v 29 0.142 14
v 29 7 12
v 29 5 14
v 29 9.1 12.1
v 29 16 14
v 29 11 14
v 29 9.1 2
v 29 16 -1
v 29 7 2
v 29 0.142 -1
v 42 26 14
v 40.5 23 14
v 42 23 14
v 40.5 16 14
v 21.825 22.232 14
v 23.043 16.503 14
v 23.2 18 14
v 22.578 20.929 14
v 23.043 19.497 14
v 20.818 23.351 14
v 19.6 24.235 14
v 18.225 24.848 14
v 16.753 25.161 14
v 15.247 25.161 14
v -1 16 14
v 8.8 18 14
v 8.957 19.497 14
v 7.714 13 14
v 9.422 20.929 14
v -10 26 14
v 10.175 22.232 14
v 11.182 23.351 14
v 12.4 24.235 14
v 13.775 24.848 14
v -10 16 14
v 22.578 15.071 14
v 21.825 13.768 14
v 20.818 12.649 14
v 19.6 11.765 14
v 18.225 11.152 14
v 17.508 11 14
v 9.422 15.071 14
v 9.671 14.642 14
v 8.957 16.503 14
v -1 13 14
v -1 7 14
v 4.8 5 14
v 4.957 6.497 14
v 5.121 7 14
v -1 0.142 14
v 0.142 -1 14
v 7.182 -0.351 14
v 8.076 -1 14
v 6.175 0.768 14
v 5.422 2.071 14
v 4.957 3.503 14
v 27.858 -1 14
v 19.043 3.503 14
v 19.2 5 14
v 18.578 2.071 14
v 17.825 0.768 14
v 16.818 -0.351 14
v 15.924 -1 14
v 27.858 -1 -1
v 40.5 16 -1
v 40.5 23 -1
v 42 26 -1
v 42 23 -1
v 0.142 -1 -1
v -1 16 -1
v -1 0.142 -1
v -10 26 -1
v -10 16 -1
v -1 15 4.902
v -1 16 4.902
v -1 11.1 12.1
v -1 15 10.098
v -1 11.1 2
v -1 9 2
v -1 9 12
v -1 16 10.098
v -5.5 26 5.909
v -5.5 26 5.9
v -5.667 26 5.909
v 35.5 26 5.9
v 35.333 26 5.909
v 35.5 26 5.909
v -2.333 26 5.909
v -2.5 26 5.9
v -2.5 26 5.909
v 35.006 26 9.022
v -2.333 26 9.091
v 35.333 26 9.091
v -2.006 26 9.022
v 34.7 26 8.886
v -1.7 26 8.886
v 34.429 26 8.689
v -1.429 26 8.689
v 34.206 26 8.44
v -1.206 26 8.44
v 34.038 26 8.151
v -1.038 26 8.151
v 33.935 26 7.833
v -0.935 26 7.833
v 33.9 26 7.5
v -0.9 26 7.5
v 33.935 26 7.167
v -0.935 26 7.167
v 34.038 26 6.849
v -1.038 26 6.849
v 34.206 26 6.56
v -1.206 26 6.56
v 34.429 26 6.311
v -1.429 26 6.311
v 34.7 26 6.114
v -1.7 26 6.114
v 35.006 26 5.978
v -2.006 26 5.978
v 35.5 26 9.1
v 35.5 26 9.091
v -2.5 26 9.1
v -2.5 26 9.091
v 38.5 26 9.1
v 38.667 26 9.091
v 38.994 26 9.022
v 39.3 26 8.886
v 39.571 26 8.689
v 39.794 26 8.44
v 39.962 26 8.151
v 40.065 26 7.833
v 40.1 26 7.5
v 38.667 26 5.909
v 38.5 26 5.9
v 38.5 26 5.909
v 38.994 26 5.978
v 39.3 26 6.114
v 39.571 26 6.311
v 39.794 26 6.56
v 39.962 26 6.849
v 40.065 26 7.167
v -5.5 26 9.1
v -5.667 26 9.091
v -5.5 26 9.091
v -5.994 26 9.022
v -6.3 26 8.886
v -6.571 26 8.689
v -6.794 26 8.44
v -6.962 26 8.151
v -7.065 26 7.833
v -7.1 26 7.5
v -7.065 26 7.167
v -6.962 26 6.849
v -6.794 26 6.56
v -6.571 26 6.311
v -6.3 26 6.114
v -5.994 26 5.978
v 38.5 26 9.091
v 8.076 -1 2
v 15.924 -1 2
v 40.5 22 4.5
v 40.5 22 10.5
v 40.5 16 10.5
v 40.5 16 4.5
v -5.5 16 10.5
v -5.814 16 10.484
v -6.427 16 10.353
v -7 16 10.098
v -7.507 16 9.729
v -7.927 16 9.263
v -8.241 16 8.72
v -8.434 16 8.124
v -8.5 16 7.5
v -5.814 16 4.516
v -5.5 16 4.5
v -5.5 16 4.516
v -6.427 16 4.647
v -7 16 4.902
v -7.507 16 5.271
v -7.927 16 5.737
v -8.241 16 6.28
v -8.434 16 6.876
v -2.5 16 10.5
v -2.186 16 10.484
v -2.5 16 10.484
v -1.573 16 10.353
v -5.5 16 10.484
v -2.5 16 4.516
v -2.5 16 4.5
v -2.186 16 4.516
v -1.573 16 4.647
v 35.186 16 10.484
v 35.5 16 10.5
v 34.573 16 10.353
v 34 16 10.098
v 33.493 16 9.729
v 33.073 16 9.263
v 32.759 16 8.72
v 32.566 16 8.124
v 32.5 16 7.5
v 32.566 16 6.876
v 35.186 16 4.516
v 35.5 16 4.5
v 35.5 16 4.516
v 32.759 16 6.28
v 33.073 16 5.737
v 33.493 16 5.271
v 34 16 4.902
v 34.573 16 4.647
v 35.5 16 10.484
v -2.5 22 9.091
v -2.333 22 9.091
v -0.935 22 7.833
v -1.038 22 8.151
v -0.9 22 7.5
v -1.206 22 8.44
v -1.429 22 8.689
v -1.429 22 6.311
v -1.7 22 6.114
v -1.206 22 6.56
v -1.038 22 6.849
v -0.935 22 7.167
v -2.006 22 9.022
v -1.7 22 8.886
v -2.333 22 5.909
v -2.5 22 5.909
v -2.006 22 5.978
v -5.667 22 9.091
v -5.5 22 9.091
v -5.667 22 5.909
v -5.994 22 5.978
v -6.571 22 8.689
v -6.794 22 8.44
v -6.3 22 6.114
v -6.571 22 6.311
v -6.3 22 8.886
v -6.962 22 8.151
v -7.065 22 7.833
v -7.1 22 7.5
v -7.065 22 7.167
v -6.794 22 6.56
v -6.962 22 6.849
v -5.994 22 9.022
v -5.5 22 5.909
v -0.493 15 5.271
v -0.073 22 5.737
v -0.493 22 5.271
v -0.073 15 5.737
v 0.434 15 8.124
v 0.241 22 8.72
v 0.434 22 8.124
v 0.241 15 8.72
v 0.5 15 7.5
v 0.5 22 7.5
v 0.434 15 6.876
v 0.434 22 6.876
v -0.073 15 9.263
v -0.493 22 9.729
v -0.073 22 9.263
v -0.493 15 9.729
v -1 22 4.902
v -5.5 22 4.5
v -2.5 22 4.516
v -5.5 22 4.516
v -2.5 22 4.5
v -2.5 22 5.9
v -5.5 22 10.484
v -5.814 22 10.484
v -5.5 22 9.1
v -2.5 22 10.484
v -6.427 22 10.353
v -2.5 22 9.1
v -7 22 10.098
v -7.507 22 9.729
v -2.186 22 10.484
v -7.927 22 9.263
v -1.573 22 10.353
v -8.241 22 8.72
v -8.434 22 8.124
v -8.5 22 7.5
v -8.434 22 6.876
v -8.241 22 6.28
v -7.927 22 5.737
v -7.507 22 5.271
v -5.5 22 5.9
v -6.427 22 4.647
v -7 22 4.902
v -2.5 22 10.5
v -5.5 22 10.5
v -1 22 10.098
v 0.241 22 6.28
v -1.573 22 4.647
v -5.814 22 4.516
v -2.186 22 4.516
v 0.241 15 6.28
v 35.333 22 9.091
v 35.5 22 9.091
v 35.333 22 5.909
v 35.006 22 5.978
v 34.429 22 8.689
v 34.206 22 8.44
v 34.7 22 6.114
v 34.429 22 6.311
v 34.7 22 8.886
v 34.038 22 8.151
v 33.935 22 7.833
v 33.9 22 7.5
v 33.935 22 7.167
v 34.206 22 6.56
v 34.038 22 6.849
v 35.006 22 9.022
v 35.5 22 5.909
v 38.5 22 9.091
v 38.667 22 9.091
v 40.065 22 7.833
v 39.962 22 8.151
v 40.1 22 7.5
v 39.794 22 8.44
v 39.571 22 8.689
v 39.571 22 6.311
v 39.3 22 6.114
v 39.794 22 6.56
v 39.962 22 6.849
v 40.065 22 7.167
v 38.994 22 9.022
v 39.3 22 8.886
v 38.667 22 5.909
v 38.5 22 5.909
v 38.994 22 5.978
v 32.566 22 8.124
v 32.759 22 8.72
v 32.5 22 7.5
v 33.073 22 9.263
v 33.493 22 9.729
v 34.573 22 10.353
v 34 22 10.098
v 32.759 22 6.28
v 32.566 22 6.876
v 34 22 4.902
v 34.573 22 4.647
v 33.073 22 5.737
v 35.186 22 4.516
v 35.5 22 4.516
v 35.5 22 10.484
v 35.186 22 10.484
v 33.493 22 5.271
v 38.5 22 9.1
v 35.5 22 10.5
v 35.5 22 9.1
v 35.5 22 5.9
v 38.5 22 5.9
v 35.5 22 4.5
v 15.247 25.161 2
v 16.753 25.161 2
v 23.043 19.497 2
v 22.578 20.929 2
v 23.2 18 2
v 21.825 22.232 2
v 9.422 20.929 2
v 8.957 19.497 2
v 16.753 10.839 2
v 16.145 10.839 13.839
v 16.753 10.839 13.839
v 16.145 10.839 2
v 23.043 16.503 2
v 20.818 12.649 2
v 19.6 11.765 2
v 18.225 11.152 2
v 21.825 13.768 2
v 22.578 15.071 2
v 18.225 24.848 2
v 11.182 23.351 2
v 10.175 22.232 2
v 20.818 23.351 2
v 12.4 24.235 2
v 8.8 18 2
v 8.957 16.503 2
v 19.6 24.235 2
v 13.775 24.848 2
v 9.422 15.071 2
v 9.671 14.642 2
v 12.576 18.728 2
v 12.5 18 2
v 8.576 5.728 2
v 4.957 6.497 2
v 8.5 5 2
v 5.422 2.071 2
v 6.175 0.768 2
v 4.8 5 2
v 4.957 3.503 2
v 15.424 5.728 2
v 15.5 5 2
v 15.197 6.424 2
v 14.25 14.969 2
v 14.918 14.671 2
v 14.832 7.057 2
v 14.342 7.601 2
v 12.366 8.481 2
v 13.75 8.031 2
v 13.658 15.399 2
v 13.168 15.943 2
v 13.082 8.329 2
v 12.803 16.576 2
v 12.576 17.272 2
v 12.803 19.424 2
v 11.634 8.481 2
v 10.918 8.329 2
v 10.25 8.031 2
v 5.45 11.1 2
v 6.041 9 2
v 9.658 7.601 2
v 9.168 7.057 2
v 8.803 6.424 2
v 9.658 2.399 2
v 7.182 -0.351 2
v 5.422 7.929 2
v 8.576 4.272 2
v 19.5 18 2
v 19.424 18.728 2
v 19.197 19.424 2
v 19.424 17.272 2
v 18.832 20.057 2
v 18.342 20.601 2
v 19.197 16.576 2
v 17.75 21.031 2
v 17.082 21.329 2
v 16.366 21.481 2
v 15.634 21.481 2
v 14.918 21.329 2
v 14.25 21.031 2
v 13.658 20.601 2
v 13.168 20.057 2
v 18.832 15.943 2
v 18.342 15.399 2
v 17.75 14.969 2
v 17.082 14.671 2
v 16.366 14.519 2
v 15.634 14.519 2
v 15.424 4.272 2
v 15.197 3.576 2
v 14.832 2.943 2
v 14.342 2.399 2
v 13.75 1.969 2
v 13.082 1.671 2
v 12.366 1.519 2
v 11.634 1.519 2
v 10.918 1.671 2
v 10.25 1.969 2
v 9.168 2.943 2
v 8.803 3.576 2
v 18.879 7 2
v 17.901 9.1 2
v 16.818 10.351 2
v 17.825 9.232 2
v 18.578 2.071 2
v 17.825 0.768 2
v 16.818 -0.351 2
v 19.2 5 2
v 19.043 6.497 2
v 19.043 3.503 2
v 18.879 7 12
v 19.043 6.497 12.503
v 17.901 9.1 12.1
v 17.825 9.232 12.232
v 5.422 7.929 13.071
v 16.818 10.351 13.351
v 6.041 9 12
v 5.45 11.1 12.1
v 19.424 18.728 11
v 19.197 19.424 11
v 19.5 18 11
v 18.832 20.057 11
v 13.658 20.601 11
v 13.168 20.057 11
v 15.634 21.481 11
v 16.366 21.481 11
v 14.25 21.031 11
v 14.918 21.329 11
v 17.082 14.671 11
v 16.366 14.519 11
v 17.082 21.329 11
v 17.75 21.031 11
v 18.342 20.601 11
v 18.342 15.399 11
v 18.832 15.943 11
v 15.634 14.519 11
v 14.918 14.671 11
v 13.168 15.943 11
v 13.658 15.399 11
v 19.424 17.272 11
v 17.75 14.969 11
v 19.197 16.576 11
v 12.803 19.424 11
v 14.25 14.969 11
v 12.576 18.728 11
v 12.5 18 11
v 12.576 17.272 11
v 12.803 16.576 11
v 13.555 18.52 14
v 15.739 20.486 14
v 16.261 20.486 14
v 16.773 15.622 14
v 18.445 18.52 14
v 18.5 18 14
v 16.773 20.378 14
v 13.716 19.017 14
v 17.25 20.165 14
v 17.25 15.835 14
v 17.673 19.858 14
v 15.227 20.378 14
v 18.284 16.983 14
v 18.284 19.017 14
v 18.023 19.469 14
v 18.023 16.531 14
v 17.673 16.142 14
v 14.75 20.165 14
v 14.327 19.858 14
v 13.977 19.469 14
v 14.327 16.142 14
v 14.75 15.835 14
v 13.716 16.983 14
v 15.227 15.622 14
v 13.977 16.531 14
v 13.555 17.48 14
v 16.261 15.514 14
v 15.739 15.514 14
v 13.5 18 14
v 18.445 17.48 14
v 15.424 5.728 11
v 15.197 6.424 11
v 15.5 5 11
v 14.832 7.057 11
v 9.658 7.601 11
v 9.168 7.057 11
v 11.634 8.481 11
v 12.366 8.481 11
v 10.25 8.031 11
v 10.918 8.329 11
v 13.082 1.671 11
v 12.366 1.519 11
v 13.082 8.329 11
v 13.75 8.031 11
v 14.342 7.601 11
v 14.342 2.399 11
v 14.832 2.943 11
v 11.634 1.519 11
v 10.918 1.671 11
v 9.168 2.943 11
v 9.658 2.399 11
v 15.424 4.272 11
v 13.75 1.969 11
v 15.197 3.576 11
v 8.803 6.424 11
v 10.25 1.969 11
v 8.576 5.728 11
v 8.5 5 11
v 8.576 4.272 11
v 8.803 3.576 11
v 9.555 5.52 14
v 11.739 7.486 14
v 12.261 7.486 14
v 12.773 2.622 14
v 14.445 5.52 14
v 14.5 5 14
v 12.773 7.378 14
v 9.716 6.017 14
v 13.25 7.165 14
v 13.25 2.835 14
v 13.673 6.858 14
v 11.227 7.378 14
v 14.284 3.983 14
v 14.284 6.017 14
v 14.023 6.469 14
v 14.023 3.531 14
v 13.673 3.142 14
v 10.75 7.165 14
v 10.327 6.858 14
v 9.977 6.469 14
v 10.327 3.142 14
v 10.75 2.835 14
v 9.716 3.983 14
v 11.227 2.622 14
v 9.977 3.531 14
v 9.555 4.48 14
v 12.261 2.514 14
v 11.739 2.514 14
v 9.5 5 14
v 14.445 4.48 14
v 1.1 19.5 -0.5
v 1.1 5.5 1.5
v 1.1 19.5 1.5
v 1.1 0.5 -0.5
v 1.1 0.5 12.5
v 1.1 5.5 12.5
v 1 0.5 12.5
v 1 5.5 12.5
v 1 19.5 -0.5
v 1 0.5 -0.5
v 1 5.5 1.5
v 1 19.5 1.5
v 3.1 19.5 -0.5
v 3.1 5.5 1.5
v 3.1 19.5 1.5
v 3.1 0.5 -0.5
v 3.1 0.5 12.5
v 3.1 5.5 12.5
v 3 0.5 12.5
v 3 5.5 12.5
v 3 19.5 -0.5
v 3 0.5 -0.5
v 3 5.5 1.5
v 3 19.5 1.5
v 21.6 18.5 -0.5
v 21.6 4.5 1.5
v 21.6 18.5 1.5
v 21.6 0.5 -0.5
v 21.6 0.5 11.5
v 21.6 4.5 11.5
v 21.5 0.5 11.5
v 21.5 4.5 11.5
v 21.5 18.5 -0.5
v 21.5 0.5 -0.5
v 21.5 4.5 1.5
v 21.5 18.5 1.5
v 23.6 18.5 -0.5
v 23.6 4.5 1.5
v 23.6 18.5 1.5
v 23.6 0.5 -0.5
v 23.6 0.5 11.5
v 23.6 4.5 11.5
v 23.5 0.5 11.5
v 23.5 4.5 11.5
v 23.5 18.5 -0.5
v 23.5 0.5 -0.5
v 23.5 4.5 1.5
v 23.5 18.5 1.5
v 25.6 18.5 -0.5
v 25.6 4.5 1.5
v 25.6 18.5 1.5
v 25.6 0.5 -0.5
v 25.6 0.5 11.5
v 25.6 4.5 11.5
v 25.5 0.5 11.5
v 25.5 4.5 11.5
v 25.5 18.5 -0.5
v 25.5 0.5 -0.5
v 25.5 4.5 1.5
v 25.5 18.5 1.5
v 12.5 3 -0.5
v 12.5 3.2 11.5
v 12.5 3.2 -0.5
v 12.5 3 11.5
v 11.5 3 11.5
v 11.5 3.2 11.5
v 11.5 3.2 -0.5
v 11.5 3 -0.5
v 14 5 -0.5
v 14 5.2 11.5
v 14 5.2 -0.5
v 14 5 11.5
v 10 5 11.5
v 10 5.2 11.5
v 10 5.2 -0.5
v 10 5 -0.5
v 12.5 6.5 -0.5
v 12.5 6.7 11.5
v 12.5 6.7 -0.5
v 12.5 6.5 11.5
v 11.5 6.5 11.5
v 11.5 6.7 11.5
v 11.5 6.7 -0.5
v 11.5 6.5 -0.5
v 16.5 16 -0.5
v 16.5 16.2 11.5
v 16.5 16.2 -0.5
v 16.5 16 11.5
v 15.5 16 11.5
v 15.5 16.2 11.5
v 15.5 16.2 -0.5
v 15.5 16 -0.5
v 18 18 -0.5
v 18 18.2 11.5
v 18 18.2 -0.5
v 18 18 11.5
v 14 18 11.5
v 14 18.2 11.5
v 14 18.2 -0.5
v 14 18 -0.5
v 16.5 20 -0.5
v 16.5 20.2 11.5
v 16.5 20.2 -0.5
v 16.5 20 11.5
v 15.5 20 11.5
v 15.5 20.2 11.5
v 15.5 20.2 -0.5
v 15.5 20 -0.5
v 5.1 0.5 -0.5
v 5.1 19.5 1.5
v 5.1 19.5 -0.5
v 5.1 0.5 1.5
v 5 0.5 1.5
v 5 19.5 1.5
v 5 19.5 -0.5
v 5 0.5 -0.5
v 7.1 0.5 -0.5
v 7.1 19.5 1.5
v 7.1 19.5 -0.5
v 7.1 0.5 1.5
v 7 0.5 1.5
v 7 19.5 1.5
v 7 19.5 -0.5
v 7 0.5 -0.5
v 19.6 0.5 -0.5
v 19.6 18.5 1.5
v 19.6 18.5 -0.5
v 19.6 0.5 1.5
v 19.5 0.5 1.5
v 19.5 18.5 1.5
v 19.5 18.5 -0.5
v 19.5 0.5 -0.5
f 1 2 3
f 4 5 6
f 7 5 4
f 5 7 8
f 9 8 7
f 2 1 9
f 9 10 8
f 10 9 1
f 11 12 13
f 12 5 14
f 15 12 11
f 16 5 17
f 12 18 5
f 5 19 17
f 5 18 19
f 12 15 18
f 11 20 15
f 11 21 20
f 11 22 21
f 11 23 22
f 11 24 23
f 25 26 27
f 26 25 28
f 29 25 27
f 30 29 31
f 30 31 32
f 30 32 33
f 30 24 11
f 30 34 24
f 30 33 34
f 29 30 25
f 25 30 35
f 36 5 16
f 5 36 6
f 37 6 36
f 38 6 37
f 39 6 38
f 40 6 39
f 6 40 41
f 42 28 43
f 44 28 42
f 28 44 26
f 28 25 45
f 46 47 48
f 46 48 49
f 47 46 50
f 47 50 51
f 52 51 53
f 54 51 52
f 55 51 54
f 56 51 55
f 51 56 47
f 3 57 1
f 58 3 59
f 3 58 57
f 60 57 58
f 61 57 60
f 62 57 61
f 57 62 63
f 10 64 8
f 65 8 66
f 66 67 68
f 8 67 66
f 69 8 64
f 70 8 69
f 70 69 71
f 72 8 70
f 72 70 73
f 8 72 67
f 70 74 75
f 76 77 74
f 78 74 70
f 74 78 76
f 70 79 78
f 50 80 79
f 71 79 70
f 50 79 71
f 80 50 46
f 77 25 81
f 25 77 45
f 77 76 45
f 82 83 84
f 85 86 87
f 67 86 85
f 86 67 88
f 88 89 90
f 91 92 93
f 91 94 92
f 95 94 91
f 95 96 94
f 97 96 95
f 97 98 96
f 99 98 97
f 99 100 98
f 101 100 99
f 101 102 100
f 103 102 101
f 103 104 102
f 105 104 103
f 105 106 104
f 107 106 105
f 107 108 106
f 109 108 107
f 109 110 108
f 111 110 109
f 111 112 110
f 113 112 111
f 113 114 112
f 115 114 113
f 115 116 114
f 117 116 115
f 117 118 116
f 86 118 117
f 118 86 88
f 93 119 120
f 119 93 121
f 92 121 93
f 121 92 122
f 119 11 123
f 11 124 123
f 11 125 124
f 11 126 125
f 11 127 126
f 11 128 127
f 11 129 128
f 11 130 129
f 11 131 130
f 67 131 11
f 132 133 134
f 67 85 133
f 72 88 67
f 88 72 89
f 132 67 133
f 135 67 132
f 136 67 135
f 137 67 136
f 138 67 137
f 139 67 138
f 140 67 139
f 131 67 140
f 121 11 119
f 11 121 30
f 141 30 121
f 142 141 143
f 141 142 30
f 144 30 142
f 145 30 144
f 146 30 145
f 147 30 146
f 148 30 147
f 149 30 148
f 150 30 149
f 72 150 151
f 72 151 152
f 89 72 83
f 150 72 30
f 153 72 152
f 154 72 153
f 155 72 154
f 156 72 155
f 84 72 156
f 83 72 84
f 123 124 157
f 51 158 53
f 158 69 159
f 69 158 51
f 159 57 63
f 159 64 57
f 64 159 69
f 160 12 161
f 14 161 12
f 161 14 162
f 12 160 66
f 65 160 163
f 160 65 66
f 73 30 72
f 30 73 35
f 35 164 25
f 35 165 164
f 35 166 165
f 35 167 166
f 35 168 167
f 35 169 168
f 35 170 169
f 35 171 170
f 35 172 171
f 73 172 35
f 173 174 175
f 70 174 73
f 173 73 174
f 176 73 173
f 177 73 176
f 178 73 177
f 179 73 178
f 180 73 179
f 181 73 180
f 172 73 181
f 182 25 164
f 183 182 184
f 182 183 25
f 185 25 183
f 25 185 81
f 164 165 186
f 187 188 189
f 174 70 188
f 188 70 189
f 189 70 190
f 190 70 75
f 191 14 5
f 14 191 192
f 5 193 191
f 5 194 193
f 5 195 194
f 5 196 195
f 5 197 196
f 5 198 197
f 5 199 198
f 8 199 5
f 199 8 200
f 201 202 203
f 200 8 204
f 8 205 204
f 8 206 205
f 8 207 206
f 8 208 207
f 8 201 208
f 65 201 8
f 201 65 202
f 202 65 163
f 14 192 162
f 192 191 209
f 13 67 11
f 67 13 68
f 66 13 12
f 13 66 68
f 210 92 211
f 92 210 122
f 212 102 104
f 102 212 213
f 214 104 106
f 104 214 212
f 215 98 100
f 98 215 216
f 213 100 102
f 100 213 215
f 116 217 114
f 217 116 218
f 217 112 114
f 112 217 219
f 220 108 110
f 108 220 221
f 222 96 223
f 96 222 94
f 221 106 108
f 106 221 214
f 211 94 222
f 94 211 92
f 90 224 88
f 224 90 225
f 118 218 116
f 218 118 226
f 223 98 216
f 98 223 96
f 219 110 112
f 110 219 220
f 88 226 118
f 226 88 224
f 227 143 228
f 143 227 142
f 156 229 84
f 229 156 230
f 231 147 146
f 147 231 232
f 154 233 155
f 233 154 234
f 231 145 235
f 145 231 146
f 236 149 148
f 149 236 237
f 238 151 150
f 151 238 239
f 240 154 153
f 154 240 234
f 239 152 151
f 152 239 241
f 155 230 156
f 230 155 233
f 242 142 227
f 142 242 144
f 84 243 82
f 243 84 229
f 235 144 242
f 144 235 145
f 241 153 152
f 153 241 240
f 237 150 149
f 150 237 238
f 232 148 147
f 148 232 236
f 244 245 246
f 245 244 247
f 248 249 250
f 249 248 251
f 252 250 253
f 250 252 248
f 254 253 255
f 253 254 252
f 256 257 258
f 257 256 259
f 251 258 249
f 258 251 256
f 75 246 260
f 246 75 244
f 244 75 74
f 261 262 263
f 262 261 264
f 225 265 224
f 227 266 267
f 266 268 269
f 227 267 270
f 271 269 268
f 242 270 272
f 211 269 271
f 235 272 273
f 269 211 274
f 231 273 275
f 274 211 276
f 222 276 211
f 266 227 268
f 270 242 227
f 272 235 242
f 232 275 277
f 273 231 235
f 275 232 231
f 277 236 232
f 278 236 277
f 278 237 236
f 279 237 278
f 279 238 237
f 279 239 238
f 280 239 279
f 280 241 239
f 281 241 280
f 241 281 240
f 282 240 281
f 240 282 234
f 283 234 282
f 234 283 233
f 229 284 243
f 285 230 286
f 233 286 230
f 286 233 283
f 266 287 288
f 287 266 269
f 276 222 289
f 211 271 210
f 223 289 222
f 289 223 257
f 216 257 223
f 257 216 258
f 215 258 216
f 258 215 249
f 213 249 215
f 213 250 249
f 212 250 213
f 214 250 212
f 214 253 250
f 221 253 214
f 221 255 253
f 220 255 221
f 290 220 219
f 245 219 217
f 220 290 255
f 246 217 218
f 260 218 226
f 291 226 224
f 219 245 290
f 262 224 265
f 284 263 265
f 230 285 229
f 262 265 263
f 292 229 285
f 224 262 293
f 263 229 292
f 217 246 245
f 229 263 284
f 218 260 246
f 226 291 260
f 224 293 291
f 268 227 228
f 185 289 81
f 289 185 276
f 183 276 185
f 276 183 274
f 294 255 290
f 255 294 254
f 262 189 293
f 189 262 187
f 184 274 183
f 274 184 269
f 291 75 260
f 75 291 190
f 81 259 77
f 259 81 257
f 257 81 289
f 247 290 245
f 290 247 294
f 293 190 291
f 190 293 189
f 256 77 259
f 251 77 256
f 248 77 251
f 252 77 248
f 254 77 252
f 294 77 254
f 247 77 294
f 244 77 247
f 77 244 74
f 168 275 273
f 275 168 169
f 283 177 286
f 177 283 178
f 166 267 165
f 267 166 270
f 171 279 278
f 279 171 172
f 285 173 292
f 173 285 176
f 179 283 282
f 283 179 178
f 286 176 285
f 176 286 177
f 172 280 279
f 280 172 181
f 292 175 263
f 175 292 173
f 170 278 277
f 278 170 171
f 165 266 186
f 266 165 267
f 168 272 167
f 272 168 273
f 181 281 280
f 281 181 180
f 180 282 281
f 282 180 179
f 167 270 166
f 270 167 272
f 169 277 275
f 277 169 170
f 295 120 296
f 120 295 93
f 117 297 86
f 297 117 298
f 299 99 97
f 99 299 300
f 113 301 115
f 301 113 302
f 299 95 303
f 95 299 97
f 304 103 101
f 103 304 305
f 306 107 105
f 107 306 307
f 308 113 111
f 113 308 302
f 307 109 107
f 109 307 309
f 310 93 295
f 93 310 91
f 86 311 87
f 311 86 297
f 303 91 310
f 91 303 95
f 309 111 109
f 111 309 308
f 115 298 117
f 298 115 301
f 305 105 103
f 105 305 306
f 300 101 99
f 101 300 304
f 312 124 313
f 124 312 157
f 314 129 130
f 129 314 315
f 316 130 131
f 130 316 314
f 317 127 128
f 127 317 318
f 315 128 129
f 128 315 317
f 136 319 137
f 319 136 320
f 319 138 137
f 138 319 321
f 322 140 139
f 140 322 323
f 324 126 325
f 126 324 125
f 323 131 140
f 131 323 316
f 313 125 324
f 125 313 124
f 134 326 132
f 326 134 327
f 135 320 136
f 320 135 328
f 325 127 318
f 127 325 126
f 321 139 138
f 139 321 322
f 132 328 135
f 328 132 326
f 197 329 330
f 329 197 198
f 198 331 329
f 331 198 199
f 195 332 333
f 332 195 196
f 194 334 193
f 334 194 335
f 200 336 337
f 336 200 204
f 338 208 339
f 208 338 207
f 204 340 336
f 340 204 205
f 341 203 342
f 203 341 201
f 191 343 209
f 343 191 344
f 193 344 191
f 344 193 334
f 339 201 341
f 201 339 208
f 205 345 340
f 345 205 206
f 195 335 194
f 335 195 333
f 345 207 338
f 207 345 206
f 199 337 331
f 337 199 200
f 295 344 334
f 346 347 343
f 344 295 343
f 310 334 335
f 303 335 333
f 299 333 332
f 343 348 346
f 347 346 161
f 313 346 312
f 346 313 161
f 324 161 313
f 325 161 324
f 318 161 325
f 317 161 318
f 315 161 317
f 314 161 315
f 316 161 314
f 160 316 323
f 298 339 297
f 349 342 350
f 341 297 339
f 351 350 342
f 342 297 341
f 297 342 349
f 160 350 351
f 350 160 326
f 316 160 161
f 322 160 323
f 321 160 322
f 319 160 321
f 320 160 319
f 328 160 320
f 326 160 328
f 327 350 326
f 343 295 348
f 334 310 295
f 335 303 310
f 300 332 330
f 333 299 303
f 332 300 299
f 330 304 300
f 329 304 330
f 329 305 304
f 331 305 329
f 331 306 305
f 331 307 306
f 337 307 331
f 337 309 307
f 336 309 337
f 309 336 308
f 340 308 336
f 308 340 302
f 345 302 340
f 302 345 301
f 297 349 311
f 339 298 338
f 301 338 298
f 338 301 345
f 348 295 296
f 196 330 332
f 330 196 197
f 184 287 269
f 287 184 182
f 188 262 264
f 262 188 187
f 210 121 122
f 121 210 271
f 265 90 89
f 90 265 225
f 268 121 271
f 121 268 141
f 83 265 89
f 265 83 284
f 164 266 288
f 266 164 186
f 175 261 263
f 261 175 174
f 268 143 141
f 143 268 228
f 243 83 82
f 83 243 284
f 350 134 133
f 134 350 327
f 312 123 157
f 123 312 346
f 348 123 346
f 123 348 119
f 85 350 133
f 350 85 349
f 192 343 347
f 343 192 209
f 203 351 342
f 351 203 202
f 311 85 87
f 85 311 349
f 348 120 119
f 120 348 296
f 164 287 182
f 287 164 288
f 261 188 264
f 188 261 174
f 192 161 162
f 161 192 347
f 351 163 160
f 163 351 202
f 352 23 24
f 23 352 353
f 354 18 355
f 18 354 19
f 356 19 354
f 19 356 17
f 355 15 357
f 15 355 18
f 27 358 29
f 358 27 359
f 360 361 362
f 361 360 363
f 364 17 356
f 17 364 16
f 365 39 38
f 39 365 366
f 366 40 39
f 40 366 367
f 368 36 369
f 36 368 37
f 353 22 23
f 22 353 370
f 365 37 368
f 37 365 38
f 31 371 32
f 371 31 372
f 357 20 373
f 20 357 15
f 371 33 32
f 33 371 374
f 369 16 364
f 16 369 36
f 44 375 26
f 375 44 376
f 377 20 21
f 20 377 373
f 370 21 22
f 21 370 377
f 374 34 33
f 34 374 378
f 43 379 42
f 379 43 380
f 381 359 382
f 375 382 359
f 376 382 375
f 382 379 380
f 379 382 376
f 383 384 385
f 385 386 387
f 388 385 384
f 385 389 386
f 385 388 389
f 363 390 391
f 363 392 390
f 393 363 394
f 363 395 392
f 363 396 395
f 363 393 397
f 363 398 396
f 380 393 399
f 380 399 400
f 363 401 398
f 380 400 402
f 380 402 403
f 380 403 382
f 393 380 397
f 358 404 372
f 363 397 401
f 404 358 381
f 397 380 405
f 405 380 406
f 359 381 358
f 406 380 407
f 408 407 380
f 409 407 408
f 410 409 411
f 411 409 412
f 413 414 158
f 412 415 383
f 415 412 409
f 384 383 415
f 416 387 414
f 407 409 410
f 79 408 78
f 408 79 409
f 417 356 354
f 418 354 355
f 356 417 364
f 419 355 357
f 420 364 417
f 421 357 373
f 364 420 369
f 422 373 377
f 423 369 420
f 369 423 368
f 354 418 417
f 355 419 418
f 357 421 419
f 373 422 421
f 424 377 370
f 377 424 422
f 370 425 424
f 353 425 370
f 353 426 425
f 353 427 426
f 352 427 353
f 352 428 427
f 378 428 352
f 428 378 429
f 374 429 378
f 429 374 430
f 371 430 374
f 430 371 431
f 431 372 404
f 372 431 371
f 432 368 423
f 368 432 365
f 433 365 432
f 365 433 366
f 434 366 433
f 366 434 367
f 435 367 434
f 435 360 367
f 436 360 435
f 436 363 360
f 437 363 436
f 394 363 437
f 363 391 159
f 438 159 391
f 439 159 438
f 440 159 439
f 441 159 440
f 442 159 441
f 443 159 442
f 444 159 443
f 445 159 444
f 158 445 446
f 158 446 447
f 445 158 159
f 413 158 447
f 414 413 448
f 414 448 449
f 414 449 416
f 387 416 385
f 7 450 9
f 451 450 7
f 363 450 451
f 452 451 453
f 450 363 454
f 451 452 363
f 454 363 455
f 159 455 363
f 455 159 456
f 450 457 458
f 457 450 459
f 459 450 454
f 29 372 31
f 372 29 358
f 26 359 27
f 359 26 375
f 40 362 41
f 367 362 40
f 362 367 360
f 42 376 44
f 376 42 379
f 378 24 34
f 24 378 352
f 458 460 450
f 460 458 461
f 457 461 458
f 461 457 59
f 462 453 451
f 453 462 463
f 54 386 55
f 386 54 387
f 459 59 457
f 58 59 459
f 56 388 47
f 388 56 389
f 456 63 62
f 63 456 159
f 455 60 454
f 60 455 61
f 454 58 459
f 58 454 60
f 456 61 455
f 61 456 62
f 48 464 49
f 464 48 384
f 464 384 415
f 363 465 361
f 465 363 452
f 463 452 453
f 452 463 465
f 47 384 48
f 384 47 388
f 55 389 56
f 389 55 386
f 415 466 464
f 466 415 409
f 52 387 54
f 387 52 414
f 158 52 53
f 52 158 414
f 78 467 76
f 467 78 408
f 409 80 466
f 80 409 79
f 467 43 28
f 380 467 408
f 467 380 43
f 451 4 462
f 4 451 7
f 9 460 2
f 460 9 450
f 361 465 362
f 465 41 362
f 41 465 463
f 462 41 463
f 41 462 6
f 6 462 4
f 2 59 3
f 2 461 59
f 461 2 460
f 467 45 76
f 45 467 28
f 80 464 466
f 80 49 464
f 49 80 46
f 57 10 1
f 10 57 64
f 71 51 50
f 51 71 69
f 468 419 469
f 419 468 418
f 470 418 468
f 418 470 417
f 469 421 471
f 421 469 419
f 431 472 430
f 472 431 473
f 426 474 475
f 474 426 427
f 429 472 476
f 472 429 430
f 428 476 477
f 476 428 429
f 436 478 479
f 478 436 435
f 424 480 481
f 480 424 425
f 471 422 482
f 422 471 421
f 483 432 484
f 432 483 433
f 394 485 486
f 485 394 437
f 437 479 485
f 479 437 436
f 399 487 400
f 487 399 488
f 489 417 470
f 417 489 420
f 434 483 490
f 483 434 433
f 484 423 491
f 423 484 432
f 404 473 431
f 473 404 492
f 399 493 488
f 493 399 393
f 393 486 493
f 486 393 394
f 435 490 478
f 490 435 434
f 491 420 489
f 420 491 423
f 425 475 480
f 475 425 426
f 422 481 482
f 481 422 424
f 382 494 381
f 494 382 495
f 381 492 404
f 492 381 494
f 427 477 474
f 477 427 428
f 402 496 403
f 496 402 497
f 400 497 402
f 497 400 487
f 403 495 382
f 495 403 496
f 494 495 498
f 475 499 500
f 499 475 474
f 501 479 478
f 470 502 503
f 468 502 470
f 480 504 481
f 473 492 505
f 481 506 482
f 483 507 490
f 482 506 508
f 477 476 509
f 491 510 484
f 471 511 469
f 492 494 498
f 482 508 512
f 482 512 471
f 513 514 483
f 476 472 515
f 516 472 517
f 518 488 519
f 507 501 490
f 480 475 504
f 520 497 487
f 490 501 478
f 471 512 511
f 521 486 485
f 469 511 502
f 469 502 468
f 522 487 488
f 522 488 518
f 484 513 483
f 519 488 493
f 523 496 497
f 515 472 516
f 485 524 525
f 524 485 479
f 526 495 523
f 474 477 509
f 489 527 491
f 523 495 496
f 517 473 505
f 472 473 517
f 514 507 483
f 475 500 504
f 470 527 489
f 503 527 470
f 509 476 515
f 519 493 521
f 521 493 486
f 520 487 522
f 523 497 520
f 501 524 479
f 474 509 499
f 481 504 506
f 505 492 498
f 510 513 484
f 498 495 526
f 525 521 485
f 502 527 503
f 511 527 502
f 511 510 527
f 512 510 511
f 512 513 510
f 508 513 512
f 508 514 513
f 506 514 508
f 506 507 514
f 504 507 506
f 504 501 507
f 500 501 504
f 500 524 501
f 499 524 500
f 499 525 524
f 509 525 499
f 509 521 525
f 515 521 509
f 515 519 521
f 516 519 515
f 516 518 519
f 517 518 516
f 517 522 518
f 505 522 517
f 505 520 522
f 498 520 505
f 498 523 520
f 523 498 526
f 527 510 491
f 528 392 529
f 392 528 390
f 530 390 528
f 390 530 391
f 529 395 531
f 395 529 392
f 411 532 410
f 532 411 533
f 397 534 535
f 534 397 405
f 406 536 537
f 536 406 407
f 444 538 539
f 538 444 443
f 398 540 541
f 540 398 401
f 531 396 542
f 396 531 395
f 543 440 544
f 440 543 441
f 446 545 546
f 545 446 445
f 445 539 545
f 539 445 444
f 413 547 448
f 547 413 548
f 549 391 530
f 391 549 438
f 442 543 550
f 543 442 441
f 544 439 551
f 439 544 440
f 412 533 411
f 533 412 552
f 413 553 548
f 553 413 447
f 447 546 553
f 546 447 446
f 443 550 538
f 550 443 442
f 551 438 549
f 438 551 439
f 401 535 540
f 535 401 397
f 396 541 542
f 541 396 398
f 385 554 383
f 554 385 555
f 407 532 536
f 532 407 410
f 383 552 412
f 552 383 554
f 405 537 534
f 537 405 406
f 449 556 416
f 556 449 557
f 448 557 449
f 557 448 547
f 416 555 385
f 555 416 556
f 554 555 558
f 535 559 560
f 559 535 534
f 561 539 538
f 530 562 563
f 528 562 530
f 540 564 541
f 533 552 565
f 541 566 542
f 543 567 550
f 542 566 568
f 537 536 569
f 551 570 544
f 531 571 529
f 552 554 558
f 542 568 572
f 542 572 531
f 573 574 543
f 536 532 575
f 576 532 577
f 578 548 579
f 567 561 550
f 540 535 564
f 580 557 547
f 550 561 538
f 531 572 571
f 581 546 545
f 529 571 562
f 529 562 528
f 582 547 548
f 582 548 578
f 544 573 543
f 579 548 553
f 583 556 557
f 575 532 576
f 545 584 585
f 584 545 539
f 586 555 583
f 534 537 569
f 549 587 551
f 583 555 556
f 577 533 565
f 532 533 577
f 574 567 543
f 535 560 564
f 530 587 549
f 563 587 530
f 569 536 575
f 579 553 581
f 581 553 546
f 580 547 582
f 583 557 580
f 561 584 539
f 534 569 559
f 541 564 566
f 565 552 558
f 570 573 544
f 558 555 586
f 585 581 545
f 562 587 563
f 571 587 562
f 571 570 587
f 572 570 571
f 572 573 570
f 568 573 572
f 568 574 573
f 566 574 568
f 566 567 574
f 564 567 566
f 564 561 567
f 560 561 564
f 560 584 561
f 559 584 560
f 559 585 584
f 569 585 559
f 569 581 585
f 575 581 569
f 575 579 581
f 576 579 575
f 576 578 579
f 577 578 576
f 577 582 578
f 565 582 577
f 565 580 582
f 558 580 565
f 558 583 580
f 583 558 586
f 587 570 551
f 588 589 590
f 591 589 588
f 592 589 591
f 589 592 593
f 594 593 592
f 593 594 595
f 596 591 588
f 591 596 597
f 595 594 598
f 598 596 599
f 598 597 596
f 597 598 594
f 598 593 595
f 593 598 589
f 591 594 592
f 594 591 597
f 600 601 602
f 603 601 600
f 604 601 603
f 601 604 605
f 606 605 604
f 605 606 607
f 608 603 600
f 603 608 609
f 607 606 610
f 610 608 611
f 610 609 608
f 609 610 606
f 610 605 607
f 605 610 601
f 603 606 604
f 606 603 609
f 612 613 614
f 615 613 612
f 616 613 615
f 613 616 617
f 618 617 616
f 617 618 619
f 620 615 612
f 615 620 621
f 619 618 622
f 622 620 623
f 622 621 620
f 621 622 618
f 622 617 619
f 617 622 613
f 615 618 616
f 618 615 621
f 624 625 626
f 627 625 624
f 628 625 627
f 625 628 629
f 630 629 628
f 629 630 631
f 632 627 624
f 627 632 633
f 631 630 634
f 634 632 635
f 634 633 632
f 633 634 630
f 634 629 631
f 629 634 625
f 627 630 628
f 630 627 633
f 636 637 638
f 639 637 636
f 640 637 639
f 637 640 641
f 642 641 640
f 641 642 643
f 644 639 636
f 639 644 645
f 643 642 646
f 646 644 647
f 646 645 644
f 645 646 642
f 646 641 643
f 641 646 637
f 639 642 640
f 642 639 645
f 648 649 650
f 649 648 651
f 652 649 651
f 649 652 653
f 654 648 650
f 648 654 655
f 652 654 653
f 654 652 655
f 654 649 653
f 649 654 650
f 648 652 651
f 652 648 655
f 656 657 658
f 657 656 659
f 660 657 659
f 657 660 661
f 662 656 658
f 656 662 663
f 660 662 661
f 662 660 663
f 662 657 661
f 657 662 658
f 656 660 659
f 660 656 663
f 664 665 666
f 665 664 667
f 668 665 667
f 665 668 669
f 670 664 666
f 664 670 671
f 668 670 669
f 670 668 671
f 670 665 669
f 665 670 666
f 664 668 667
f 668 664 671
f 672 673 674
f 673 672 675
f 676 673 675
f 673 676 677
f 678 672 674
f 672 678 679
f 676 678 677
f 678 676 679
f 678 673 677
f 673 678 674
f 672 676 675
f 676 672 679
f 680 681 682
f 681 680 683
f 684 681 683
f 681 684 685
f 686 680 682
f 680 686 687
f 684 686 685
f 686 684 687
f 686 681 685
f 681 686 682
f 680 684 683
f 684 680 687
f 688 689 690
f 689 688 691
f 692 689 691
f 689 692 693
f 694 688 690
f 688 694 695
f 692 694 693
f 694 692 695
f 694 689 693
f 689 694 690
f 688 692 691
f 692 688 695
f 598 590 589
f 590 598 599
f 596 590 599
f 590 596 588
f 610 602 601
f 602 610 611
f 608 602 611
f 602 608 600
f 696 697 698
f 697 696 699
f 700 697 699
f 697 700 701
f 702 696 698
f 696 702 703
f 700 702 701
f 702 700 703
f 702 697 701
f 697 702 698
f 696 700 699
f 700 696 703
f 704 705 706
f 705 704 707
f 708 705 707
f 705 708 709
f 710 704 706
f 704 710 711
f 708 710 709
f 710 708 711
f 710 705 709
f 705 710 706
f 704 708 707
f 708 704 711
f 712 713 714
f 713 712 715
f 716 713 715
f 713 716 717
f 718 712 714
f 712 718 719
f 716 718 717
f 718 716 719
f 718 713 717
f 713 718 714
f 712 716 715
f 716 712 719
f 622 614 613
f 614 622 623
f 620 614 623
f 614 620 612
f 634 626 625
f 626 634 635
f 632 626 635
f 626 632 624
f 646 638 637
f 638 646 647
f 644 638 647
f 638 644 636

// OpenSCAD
// PRUSA iteration3
// Y belt holder
// GNU GPL v3
// Josef Průša <iam@josefprusa.cz> and contributors
// http://www.reprap.org/wiki/Prusa_Mendel
// http://prusamendel.org

module main_body(){
    translate([-1,-1,-1]) cube([30,27,15]);
    translate([-10,16,-1]) cube([50.5,10,15]);
    translate([-10,23,-1]) cube([52,3,15]);
}

module belt_holders(){
   translate([16,18,0]) cylinder(h=11,r=3.5,$fn=30); // Upper belt holder
   translate([16,18,11]) cylinder(h=3,r1=3.5,r2=2.5,$fn=30 ); // Upper belt holder cone

   translate([12,5,0]) cylinder(h=11,r=3.5,$fn=30); // Lower belt holder
   translate([12,5,11]) cylinder(h=3,r1=3.5,r2=2.5,$fn=30); // Lower belt holder cone
}

module screws(){
    translate([-2.5,28,7.5]) rotate([90,0,0]) cylinder(h=10,r=1.6,$fn=30); // Screw hole
    translate([-5.5,28,7.5]) rotate([90,0,0]) cylinder(h=10,r=1.6,$fn=30); // Screw hole
    translate([-2.5,22,7.5]) rotate([90,0,0]) cylinder(h=7,r=3,$fn=30); // Screw hole - head
    translate([-5.5,22,7.5]) rotate([90,0,0]) cylinder(h=10,r=3,$fn=30); // Screw hole - head

    translate([35.5,28,7.5]) rotate([90,0,0]) cylinder(h=10,r=1.6,$fn=30); // Screw hole
    translate([38.5,28,7.5]) rotate([90,0,0]) cylinder(h=10,r=1.6,$fn=30); // Screw hole
    translate([35.5,22,7.5]) rotate([90,0,0]) cylinder(h=10,r=3,$fn=30); // Screw hole - head
    translate([38.5,22,7.5]) rotate([90,0,0]) cylinder(h=10,r=3,$fn=30); // Screw hole - head

    translate([-5.5,21,5.9]) cube([3,6,3.2]);
    translate([35.5,21,5.9]) cube([3,6,3.2]);

    translate([-5.5,15,4.5]) cube([3,7,6]);
    translate([35.5,15,4.5]) cube([6,7,6]);
}

//belt_holders();
module main(){
    difference(){
        main_body();

        translate([ 16,18,2]) cylinder(h=16,r=7.2,$fn=30 ); // Upper belt space cutaway
        translate([ 12,5,2]) cylinder(h=16,r=7.2,$fn=30 ); // Lower belt space cutaway
        translate([-20,9,2]) cube([28,2.1,16]);
        rotate([0,0,40]) translate([11,1,2]) cube([10,4,16]);

        translate([10,7,2]) cube([32,2.1,16]);

        translate([16,8,11]) rotate([45,0,0]) cube([15,5,5]);
        translate([-2,10,11]) rotate([45,0,0]) cube([10,5,5]);
        screws();

        // Corner cutoff
        translate([30,-13,-2]) rotate([0,0,45]) cube([10,10,20]);
        translate([-2,-13,-2]) rotate([0,0,45]) cube([10,10,20]);
    }
}

module selective_infill(){
    // Print part reinforcement
    translate([1,0.5,-0.5]) cube([0.1,5,13]);
    translate([3,0.5,-0.5]) cube([0.1,5,13]);
    translate([21.5,0.5,-0.5]) cube([0.1,4,12]);
    translate([23.5,0.5,-0.5]) cube([0.1,4,12]);
    translate([25.5,0.5,-0.5]) cube([0.1,4,12]);
    translate([11.5,3,-0.5]) cube([1,0.2,12]);
    translate([10,5,-0.5]) cube([4,0.2,12]);
    translate([11.5,6.5,-0.5]) cube([1,0.2,12]);
    translate([15.5,16,-0.5]) cube([1,0.2,12]);
    translate([14,18,-0.5]) cube([4,0.2,12]);
    translate([15.5,20,-0.5]) cube([1,0.2,12]);

    translate([1,5.5,-0.5]) cube([0.1,14,2]);
    translate([3,5.5,-0.5]) cube([0.1,14,2]);
    translate([5,0.5,-0.5]) cube([0.1,19,2]);
    translate([7,0.5,-0.5]) cube([0.1,19,2]);

    translate([19.5,0.5,-0.5]) cube([0.1,18,2]);
    translate([21.5,4.5,-0.5]) cube([0.1,14,2]);
    translate([23.5,4.5,-0.5]) cube([0.1,14,2]);
    translate([25.5,4.5,-0.5]) cube([0.1,14,2]);
    }

module final_part(){
    difference(){
        union(){
            main();
            belt_holders();
        }
        selective_infill();
    }
}

final_part();
